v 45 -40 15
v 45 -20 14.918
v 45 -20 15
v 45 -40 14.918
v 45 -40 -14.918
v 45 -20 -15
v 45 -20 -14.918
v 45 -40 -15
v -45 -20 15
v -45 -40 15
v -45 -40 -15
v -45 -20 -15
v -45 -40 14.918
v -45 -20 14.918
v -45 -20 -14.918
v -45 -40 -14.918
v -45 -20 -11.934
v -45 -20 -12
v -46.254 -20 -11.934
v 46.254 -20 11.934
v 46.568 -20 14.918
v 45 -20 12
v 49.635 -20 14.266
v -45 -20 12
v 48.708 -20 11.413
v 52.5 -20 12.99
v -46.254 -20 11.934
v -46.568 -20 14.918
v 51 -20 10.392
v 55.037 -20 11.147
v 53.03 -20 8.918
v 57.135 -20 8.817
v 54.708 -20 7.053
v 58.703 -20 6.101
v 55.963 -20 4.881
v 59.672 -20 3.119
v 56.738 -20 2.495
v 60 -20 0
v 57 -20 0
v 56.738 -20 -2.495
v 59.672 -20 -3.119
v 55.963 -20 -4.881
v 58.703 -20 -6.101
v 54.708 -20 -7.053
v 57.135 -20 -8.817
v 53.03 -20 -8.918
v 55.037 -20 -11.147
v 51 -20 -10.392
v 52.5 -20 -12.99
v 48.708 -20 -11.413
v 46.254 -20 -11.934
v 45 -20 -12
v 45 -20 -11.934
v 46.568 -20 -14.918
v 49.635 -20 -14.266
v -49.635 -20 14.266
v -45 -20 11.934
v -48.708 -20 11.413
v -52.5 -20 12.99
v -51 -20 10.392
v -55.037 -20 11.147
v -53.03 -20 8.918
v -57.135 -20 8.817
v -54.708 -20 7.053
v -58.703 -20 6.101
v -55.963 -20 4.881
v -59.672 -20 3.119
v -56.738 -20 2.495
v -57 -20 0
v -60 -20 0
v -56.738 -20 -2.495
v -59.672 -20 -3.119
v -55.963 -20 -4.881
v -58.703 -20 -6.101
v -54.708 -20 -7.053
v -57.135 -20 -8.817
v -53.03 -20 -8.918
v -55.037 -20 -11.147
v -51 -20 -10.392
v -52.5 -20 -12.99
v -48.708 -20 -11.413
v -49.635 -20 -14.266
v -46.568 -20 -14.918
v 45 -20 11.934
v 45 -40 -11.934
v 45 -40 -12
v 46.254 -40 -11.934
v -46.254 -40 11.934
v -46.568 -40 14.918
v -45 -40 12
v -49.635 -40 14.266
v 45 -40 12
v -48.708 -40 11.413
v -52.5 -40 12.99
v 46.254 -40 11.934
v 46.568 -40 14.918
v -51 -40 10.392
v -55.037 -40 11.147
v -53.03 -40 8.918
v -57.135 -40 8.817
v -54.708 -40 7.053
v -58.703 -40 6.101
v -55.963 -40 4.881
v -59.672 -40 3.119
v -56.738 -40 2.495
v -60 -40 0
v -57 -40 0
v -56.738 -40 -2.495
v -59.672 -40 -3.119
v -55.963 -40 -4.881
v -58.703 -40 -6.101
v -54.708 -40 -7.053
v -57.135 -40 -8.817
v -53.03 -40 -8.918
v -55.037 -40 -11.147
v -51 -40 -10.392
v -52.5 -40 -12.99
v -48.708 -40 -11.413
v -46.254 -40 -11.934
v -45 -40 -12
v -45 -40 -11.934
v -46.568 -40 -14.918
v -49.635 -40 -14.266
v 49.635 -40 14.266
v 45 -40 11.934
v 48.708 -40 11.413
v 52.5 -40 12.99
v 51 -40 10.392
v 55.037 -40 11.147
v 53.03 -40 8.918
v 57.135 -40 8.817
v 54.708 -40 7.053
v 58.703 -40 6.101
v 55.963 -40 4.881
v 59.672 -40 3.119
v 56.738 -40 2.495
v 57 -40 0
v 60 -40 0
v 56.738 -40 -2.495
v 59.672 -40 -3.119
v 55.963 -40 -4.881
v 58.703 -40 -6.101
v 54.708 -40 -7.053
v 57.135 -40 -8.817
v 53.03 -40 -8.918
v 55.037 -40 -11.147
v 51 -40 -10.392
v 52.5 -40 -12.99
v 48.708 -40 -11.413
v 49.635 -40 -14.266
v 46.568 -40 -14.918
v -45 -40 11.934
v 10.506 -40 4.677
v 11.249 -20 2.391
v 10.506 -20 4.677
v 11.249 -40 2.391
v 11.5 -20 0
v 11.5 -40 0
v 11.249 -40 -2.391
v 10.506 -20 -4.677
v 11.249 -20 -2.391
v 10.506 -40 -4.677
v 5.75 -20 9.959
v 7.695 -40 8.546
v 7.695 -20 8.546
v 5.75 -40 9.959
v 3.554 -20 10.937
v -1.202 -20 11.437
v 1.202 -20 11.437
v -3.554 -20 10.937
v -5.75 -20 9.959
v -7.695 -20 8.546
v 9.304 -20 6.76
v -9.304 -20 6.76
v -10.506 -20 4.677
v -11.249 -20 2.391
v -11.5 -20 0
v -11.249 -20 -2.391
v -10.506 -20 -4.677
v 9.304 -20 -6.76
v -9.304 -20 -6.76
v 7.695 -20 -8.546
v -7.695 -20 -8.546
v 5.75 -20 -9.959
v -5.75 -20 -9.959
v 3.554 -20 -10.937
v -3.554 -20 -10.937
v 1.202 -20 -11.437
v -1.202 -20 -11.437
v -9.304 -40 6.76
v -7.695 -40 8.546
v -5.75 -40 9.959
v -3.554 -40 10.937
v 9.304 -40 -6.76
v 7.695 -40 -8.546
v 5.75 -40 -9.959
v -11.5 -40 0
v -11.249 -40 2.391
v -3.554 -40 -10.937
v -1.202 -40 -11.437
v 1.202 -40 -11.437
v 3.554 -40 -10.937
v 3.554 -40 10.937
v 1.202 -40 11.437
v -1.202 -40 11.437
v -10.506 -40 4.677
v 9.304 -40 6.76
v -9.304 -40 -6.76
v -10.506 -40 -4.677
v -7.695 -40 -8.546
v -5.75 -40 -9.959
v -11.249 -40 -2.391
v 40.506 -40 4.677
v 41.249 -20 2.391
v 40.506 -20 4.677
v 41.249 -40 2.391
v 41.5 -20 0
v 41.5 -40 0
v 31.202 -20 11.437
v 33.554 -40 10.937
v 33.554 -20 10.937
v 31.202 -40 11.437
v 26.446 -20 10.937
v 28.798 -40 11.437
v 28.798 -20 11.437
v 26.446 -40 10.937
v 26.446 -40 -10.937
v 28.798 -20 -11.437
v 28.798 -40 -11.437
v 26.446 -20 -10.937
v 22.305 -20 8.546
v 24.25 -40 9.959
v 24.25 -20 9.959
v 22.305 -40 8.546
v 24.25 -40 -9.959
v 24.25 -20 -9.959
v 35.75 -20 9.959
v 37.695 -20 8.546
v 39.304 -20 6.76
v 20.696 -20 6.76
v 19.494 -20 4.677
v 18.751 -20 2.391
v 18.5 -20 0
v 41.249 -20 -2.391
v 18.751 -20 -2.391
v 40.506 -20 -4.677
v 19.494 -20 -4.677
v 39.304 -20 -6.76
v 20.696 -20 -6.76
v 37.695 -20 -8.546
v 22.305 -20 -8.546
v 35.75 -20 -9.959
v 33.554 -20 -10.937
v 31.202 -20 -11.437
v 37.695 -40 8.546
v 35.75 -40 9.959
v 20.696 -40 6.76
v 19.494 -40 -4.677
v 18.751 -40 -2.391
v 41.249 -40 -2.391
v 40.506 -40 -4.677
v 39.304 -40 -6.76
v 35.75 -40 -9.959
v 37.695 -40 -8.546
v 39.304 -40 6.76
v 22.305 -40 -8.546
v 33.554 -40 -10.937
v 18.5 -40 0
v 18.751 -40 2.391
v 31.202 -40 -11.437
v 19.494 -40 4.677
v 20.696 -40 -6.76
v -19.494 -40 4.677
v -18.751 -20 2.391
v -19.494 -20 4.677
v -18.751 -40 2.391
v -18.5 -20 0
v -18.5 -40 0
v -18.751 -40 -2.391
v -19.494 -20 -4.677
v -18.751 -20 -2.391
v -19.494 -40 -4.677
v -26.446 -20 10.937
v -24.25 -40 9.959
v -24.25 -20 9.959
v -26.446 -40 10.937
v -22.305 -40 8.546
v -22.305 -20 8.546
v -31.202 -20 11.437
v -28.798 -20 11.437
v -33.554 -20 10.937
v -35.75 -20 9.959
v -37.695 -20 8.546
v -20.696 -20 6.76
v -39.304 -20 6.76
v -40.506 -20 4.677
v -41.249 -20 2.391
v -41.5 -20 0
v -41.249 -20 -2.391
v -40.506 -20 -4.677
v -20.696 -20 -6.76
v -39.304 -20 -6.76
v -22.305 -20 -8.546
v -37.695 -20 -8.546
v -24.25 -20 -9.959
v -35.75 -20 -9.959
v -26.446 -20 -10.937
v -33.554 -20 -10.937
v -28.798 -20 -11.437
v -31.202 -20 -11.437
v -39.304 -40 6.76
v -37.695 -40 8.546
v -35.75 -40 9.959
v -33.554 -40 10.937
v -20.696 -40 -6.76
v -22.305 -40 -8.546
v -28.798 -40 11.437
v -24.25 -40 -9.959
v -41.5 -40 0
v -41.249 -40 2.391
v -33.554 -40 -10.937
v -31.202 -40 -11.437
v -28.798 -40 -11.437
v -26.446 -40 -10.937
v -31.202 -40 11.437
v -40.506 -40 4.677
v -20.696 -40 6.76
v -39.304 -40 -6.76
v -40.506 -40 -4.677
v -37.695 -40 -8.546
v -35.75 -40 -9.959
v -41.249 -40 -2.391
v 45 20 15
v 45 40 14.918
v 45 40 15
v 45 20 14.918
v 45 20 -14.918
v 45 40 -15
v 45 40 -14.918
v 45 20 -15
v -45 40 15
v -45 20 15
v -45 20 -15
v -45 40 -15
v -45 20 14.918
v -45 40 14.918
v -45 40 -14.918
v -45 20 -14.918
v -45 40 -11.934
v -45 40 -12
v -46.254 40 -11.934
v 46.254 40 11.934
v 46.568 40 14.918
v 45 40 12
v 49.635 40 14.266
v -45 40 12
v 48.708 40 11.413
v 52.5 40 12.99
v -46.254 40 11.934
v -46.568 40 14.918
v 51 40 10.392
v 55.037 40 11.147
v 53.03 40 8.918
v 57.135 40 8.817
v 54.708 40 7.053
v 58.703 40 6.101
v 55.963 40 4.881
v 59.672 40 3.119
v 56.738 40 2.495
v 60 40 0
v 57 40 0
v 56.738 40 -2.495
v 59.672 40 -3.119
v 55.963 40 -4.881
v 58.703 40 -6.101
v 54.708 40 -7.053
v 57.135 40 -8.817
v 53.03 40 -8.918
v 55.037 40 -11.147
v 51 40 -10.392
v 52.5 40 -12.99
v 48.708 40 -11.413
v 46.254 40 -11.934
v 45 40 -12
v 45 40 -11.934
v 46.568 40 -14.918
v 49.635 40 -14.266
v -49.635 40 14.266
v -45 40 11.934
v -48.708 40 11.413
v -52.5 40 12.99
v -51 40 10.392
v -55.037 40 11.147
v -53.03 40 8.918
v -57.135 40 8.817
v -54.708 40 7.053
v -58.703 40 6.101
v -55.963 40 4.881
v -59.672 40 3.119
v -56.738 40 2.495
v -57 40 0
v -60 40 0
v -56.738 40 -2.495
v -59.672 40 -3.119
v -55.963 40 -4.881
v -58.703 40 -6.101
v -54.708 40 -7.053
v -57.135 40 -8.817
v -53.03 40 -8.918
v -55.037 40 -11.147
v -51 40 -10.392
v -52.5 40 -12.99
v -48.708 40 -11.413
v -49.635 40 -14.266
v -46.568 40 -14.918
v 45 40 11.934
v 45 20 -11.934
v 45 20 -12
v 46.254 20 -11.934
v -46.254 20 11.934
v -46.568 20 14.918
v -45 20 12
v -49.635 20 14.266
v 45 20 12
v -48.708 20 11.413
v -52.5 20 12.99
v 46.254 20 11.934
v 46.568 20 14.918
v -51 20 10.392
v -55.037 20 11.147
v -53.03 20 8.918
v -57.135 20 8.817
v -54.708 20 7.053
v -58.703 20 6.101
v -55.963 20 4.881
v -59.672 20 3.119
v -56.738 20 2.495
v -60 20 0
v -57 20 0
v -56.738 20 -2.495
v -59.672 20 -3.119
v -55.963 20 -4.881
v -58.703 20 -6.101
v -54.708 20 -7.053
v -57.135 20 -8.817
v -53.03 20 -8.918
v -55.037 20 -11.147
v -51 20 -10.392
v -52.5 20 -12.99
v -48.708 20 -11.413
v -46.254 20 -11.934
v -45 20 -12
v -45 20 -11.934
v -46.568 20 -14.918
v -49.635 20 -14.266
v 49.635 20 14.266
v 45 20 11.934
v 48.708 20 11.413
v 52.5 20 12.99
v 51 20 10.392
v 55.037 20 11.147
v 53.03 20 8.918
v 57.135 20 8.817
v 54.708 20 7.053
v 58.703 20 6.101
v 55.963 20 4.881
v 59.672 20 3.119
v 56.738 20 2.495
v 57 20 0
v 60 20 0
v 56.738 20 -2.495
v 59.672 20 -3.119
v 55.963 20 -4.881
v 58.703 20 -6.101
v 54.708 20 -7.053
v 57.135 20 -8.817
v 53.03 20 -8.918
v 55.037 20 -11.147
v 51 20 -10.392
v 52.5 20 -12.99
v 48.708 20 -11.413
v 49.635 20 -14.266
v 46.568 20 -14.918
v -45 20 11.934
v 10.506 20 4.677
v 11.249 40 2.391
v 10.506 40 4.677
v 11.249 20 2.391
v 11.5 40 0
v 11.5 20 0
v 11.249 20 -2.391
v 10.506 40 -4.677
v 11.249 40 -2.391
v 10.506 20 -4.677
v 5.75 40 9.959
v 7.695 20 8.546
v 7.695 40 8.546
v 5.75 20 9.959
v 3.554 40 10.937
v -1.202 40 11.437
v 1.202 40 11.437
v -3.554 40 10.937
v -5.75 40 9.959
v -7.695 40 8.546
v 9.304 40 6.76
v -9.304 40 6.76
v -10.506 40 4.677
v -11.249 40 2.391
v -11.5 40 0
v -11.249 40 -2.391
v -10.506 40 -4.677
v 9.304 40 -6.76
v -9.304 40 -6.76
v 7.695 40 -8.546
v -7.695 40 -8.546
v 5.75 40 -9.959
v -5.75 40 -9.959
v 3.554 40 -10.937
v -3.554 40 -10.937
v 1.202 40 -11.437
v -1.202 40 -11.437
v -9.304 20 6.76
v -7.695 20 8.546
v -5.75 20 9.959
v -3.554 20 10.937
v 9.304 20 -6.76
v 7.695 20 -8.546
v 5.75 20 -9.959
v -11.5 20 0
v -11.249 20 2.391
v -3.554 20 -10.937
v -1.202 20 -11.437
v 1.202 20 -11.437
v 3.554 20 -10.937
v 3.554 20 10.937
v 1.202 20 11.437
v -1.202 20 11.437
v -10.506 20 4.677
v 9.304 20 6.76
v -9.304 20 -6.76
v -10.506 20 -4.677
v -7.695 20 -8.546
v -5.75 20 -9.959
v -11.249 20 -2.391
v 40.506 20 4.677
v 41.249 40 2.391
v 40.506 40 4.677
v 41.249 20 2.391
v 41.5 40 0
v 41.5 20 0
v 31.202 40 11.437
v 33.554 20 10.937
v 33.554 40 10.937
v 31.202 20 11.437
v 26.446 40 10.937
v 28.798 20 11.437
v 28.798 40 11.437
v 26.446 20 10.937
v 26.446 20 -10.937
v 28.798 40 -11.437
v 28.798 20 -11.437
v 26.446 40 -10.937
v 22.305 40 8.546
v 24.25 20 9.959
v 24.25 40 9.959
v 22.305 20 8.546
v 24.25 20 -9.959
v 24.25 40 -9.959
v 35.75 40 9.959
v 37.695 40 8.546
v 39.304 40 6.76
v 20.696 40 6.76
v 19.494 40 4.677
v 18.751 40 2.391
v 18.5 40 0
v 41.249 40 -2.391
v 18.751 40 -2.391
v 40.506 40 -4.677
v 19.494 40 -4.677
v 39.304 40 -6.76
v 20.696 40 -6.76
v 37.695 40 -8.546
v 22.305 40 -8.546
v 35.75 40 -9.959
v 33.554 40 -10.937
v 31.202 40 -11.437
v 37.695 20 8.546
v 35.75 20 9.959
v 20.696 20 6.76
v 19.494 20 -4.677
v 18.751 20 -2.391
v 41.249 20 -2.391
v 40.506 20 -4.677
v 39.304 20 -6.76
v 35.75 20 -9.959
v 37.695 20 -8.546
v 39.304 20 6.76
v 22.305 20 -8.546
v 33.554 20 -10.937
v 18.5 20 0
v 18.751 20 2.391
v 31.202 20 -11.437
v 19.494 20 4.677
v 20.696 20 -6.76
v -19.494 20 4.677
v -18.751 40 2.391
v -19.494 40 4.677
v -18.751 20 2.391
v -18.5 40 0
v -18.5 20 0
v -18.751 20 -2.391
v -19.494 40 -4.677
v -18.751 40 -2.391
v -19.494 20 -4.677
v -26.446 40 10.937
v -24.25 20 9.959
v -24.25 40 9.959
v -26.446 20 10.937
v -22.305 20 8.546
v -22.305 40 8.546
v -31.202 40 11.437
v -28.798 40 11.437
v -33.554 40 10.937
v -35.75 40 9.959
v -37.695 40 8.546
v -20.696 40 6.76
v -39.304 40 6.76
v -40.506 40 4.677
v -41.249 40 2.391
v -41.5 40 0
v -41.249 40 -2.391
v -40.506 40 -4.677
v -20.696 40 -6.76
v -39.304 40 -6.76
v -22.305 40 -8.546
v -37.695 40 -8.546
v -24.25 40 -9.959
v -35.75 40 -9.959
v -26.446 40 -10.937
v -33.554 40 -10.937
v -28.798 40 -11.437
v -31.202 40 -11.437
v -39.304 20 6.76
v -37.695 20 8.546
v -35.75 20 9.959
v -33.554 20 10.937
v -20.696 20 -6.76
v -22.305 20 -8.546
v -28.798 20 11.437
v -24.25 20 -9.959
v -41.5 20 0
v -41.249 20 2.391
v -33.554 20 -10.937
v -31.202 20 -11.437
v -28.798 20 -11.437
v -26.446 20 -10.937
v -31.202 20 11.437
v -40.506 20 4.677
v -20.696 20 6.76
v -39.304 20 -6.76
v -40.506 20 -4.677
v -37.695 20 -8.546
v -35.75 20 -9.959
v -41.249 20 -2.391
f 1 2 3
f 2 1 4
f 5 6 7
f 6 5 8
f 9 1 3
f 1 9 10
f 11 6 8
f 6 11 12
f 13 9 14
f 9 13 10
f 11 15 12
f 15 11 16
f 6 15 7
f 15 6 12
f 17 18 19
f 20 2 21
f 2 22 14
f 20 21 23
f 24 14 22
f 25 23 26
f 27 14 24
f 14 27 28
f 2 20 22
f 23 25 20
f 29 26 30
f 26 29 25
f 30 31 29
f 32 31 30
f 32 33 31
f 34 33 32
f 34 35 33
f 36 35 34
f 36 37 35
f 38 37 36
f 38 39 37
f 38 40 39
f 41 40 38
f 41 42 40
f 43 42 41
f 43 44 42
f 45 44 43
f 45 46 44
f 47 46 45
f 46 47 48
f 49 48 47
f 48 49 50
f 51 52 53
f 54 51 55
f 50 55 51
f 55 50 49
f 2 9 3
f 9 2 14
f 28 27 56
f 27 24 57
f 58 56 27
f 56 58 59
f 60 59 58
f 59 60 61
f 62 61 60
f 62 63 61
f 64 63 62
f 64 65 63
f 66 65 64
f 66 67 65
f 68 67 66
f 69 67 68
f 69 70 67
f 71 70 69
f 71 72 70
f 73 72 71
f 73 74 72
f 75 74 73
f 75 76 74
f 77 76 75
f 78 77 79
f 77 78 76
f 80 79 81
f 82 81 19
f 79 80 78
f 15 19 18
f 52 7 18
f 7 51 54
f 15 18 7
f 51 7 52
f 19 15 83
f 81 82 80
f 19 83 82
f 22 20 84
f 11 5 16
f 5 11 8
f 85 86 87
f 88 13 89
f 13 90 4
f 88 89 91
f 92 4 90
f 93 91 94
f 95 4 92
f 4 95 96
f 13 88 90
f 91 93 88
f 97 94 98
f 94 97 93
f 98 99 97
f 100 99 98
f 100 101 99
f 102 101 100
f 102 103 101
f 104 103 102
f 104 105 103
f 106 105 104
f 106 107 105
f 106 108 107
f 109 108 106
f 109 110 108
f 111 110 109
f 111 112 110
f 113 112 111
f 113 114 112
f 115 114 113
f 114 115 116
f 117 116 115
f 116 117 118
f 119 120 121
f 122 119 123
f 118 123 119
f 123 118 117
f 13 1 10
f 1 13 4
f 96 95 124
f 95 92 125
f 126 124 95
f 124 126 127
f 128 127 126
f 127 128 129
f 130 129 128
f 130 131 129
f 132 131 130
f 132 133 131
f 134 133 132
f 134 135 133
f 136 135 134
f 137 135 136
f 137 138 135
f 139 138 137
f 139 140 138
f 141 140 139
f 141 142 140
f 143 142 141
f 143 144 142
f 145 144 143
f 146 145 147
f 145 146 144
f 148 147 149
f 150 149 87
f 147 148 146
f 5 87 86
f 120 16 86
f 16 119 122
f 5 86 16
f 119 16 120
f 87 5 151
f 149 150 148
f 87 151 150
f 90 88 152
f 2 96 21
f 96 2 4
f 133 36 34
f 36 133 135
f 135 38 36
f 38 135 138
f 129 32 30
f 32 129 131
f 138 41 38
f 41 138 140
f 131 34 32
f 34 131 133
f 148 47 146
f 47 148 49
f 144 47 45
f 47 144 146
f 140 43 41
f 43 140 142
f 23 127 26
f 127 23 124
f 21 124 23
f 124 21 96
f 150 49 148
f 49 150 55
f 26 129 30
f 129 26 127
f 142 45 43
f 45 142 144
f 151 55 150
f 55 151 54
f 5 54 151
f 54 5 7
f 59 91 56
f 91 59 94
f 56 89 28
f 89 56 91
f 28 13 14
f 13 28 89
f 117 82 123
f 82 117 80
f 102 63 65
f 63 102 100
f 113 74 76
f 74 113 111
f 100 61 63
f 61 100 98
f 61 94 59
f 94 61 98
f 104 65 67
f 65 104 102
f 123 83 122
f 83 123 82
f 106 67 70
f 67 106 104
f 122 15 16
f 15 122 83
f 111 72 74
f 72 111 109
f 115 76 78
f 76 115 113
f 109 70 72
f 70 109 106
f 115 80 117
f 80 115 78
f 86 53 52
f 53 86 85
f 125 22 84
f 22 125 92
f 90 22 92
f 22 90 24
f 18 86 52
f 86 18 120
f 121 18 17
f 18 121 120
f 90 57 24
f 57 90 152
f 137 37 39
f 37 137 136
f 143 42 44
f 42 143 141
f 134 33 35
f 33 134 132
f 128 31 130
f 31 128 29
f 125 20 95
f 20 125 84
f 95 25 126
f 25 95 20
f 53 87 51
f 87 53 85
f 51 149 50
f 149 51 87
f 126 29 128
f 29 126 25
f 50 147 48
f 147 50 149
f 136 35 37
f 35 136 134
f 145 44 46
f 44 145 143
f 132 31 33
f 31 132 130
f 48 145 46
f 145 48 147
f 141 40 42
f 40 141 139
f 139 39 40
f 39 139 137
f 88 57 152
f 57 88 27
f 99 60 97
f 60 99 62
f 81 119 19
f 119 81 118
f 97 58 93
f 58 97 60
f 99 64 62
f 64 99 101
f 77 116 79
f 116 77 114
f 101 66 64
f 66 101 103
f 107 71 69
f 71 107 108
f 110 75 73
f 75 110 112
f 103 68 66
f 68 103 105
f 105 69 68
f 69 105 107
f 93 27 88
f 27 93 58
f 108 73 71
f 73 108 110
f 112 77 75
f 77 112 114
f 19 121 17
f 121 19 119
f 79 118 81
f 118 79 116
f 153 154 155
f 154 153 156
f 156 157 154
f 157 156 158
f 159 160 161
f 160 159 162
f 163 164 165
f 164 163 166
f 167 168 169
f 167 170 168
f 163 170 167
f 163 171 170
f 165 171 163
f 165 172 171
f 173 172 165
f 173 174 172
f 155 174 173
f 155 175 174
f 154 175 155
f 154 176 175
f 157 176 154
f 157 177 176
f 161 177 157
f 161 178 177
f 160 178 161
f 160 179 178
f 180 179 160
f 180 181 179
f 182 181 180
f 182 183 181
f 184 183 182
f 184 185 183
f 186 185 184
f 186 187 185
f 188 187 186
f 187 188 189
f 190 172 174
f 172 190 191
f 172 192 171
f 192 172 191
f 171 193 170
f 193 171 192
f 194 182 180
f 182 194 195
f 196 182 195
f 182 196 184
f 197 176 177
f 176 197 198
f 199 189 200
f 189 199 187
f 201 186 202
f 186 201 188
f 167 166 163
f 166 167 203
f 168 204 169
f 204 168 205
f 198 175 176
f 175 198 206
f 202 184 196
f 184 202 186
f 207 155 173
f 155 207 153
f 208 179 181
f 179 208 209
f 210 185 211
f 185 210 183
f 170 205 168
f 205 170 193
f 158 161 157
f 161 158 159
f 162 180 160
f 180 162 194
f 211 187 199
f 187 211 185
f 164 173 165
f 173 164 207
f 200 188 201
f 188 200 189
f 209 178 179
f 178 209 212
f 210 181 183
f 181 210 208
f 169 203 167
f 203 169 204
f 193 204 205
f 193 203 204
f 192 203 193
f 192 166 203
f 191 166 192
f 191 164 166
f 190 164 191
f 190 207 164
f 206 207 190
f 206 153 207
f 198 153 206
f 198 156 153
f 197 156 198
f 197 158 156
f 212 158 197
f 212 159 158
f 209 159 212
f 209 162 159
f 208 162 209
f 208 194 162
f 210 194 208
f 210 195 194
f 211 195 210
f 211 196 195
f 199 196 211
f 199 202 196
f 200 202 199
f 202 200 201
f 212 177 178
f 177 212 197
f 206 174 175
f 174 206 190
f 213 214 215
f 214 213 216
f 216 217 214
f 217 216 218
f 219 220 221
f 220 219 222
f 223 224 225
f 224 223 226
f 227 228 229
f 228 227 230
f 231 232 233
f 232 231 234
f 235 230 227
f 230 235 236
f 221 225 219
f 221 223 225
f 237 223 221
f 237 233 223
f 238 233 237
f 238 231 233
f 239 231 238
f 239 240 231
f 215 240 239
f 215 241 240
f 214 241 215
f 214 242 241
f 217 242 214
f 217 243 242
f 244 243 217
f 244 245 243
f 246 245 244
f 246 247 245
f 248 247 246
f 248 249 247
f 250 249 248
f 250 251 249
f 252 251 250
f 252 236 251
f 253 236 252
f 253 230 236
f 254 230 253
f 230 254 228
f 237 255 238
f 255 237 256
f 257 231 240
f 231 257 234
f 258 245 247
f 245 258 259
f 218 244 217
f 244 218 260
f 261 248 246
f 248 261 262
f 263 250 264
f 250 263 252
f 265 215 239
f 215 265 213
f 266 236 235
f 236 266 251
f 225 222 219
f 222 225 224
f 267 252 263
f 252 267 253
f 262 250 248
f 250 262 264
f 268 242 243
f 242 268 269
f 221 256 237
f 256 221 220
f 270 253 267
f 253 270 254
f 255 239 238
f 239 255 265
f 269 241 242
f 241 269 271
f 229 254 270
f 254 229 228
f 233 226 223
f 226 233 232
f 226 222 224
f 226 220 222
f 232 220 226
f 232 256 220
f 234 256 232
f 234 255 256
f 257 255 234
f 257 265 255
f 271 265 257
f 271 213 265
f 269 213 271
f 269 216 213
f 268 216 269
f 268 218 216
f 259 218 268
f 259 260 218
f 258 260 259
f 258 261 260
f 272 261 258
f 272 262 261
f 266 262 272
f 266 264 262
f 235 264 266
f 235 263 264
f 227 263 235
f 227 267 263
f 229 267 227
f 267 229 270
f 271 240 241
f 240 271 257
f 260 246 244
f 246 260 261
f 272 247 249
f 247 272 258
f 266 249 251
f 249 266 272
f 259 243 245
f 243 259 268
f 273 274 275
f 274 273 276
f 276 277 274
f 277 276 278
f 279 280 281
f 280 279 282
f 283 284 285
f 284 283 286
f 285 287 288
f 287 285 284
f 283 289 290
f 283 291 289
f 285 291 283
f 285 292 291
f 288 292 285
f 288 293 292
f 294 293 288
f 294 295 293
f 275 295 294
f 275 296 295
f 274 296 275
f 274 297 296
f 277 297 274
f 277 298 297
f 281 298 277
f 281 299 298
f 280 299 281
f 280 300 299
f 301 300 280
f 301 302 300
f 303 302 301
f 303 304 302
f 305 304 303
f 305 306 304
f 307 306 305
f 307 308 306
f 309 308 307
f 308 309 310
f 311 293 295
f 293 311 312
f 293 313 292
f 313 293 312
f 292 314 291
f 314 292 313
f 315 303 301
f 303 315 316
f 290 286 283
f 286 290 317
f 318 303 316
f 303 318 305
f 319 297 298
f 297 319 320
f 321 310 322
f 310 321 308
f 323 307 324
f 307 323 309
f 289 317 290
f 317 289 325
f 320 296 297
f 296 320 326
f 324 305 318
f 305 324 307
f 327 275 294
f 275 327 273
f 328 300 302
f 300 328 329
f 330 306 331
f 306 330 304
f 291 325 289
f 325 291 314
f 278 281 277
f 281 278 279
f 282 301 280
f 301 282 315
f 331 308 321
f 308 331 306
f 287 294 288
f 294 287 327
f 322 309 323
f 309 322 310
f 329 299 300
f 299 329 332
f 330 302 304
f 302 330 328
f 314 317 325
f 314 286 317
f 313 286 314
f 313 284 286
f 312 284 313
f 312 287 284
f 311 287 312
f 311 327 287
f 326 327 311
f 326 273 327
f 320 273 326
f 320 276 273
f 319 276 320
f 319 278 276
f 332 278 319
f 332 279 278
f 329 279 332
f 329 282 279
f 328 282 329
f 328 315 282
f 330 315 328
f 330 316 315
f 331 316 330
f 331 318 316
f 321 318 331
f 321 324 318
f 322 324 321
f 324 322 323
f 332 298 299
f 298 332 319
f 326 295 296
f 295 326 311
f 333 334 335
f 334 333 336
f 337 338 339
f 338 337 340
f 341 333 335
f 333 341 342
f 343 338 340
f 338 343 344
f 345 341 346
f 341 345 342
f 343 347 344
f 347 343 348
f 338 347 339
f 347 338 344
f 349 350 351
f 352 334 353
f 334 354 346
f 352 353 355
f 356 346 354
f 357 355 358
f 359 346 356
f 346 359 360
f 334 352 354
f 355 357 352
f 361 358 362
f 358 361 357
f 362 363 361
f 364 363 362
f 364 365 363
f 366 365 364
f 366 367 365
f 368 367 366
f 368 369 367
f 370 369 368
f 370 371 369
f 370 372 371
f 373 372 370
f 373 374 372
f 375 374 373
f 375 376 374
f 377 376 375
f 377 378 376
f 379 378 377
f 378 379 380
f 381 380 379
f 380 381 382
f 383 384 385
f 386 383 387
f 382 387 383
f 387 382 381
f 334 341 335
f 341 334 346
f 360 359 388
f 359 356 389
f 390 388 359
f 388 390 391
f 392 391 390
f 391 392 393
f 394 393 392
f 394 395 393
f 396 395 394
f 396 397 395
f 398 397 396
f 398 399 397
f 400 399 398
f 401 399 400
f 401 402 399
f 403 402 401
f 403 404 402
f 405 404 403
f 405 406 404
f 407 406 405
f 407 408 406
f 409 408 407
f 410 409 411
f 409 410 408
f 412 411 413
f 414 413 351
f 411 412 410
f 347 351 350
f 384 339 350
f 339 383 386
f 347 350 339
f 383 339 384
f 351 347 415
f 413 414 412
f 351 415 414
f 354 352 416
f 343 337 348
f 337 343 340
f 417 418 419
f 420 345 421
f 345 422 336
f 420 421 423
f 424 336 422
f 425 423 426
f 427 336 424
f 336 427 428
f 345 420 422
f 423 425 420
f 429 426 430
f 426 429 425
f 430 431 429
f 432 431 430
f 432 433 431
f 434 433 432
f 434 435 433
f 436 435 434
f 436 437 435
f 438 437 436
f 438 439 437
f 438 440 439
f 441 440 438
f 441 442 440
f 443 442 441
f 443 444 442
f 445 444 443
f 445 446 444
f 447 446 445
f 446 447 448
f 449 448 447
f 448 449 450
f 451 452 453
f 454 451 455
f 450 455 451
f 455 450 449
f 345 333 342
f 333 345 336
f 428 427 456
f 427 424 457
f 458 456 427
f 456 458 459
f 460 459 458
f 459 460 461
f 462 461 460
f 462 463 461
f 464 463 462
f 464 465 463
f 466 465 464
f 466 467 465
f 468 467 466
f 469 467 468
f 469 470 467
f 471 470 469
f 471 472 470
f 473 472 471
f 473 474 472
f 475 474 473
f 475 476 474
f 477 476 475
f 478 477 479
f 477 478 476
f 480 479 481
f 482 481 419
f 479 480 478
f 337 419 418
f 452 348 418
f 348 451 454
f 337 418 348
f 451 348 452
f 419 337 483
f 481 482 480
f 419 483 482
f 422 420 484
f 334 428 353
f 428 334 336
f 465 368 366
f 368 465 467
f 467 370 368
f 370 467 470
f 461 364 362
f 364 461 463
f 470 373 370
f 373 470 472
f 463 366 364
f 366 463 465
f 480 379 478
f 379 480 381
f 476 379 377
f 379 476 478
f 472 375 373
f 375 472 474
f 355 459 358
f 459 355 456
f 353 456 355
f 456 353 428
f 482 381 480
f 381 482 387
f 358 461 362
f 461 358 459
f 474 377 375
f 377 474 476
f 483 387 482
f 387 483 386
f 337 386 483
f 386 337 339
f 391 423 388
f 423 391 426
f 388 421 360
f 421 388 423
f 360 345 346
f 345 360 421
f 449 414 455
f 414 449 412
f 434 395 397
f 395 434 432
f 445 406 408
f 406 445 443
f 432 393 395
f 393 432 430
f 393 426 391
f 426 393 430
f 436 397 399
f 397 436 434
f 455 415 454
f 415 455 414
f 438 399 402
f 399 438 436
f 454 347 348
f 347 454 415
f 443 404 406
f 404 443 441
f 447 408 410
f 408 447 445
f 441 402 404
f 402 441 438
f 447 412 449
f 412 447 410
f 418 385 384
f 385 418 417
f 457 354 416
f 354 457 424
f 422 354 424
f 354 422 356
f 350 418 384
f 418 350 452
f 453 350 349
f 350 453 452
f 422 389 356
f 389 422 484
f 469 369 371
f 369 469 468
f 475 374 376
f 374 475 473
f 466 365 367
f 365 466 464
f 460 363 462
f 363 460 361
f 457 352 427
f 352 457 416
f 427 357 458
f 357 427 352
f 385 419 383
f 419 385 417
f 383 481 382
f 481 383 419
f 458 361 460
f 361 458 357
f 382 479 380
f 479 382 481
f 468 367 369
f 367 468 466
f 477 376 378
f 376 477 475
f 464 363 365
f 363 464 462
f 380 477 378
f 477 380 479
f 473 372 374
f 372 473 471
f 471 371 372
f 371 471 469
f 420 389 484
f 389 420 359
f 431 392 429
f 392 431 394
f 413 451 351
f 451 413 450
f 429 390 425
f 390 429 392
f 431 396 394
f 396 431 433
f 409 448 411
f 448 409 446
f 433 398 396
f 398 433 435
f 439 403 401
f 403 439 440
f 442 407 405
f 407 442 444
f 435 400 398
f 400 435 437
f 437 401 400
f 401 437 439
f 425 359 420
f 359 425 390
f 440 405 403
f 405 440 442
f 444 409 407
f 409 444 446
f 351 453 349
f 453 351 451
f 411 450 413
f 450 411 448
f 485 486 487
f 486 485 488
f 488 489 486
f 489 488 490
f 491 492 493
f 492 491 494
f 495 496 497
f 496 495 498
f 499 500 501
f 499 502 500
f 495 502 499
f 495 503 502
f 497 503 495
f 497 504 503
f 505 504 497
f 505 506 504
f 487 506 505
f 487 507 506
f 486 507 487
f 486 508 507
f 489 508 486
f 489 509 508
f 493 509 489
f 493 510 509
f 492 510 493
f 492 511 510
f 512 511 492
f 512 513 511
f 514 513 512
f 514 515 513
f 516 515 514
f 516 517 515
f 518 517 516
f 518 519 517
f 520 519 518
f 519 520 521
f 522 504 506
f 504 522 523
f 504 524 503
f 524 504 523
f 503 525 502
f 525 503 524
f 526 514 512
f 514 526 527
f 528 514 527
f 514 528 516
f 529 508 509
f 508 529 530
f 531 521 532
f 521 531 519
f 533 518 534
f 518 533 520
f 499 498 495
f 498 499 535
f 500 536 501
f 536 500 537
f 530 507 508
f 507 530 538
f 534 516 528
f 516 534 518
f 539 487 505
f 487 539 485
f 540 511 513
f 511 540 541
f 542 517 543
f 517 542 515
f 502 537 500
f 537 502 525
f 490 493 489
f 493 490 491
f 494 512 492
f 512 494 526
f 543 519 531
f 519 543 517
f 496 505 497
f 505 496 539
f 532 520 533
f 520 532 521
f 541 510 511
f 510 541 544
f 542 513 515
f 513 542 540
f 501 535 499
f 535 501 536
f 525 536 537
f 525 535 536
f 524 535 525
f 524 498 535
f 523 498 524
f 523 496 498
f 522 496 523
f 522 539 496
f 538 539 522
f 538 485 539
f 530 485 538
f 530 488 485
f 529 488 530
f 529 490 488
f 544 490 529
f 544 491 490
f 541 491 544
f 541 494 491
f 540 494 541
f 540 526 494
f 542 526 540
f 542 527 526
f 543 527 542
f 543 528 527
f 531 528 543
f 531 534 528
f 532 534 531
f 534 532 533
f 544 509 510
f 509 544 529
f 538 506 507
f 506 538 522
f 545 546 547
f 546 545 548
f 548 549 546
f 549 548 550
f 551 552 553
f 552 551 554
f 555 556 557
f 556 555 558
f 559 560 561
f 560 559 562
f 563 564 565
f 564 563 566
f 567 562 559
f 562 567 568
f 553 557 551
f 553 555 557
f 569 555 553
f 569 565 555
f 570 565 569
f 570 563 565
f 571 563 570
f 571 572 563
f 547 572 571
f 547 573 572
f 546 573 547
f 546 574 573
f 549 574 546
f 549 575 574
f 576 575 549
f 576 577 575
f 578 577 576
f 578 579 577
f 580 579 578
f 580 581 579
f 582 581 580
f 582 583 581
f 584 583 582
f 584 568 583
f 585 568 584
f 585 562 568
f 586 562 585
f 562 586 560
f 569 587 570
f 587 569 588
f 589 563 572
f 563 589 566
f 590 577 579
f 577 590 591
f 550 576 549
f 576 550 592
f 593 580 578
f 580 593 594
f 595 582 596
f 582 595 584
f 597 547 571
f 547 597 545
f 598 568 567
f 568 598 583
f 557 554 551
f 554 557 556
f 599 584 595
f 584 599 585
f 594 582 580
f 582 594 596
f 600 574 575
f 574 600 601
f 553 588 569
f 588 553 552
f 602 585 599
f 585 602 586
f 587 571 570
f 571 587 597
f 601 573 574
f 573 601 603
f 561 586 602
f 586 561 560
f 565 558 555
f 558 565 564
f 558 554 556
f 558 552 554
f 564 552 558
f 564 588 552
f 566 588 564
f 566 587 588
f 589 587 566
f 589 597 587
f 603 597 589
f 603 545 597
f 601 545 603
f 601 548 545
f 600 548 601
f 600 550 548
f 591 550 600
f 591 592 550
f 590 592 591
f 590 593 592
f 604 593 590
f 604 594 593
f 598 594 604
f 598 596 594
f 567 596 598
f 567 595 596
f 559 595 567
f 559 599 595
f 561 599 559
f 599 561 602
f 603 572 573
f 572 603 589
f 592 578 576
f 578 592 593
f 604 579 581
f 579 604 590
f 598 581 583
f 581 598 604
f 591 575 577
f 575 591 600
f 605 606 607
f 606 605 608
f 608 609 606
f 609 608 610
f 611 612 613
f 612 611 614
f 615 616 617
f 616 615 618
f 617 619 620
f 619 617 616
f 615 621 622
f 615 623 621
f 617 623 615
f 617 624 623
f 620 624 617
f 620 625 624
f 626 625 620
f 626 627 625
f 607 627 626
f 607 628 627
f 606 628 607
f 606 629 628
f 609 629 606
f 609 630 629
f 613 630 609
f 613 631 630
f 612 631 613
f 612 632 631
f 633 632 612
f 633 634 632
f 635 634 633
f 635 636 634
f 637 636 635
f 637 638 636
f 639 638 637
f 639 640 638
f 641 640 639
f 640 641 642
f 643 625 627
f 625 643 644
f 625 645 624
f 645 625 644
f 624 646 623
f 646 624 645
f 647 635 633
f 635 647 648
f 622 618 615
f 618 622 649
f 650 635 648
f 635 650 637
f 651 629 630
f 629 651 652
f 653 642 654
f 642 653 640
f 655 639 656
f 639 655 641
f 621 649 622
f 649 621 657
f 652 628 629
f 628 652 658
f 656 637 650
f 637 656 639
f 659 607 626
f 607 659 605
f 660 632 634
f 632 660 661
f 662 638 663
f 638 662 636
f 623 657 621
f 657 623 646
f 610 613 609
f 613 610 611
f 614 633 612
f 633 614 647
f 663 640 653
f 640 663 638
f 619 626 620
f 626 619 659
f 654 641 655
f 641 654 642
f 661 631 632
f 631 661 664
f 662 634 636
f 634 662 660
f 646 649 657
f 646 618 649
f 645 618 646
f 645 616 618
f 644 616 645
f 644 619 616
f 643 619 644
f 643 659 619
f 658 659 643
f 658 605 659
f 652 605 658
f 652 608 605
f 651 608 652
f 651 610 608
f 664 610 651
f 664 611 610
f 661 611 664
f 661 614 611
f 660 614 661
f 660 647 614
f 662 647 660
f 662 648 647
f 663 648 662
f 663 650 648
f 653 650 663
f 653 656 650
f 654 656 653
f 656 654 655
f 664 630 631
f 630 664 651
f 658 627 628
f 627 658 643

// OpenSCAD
// Tank dimensions
tank_length = 100;
tank_width = 60;
tank_height = 30;




module track( track_length, track_width, track_height ){
     cube( [ track_length, track_width, track_height ], true );
     translate( [ track_length / 2, 0, 0 ] )
        wheel( track_width,track_height );
     translate( [ -track_length / 2, 0, 0 ] )
        wheel(track_width,track_height);
}

module wheel( track_width,track_height ){
         translate( [0, track_width/2, 0 ] )
         rotate( [ 90, 0, 0 ] ){
         cylinder( h = track_width, r = track_height / 2 );
    } 
}

module fulltrack( w, h, l ){
    track_width = w;
    track_height = h;
    track_length = l;

    //translate( [ 0, w / 2, 0 ] )
    difference(){
    track( track_length,track_width,tank_height );
    track( track_length,track_width + 1,tank_height * 0.8 );
    }
    
    wheel(track_width,track_height * 1.15);
    translate( [track_length/3,0, 0 ] )
    wheel(track_width,track_height * 1.15);
    translate( [-track_length/3,0, 0 ] )
    wheel(track_width,track_height * 1.15);
} 

module tracks(){
    track_width = 10;
    track_height = tank_height / 1.5;
    track_length = tank_length * 0.9;

    translate( [ 0, -tank_width / 2, 0 ] )
        fulltrack( 20, tank_height / 1.5, tank_length * 0.9);
    
    
    translate( [ 0, tank_width / 2, 0 ] )
        fulltrack( 20, tank_height / 1.5, tank_length * 0.9);
    
}

module trackspace()
{   
    track_width = 20;
    track_height = tank_height / 1.2;
    track_length = tank_length + 1;
    translate( [ 0, -tank_width /  2, 0 ] )
        cube( [ track_length, track_width, track_height ], true );
    
    
    translate( [ 0, tank_width / 2 , 0 ] )
        cube( [ track_length, track_width, track_height ], true );    
}

//trackspace();
tracks();
//track_right();
